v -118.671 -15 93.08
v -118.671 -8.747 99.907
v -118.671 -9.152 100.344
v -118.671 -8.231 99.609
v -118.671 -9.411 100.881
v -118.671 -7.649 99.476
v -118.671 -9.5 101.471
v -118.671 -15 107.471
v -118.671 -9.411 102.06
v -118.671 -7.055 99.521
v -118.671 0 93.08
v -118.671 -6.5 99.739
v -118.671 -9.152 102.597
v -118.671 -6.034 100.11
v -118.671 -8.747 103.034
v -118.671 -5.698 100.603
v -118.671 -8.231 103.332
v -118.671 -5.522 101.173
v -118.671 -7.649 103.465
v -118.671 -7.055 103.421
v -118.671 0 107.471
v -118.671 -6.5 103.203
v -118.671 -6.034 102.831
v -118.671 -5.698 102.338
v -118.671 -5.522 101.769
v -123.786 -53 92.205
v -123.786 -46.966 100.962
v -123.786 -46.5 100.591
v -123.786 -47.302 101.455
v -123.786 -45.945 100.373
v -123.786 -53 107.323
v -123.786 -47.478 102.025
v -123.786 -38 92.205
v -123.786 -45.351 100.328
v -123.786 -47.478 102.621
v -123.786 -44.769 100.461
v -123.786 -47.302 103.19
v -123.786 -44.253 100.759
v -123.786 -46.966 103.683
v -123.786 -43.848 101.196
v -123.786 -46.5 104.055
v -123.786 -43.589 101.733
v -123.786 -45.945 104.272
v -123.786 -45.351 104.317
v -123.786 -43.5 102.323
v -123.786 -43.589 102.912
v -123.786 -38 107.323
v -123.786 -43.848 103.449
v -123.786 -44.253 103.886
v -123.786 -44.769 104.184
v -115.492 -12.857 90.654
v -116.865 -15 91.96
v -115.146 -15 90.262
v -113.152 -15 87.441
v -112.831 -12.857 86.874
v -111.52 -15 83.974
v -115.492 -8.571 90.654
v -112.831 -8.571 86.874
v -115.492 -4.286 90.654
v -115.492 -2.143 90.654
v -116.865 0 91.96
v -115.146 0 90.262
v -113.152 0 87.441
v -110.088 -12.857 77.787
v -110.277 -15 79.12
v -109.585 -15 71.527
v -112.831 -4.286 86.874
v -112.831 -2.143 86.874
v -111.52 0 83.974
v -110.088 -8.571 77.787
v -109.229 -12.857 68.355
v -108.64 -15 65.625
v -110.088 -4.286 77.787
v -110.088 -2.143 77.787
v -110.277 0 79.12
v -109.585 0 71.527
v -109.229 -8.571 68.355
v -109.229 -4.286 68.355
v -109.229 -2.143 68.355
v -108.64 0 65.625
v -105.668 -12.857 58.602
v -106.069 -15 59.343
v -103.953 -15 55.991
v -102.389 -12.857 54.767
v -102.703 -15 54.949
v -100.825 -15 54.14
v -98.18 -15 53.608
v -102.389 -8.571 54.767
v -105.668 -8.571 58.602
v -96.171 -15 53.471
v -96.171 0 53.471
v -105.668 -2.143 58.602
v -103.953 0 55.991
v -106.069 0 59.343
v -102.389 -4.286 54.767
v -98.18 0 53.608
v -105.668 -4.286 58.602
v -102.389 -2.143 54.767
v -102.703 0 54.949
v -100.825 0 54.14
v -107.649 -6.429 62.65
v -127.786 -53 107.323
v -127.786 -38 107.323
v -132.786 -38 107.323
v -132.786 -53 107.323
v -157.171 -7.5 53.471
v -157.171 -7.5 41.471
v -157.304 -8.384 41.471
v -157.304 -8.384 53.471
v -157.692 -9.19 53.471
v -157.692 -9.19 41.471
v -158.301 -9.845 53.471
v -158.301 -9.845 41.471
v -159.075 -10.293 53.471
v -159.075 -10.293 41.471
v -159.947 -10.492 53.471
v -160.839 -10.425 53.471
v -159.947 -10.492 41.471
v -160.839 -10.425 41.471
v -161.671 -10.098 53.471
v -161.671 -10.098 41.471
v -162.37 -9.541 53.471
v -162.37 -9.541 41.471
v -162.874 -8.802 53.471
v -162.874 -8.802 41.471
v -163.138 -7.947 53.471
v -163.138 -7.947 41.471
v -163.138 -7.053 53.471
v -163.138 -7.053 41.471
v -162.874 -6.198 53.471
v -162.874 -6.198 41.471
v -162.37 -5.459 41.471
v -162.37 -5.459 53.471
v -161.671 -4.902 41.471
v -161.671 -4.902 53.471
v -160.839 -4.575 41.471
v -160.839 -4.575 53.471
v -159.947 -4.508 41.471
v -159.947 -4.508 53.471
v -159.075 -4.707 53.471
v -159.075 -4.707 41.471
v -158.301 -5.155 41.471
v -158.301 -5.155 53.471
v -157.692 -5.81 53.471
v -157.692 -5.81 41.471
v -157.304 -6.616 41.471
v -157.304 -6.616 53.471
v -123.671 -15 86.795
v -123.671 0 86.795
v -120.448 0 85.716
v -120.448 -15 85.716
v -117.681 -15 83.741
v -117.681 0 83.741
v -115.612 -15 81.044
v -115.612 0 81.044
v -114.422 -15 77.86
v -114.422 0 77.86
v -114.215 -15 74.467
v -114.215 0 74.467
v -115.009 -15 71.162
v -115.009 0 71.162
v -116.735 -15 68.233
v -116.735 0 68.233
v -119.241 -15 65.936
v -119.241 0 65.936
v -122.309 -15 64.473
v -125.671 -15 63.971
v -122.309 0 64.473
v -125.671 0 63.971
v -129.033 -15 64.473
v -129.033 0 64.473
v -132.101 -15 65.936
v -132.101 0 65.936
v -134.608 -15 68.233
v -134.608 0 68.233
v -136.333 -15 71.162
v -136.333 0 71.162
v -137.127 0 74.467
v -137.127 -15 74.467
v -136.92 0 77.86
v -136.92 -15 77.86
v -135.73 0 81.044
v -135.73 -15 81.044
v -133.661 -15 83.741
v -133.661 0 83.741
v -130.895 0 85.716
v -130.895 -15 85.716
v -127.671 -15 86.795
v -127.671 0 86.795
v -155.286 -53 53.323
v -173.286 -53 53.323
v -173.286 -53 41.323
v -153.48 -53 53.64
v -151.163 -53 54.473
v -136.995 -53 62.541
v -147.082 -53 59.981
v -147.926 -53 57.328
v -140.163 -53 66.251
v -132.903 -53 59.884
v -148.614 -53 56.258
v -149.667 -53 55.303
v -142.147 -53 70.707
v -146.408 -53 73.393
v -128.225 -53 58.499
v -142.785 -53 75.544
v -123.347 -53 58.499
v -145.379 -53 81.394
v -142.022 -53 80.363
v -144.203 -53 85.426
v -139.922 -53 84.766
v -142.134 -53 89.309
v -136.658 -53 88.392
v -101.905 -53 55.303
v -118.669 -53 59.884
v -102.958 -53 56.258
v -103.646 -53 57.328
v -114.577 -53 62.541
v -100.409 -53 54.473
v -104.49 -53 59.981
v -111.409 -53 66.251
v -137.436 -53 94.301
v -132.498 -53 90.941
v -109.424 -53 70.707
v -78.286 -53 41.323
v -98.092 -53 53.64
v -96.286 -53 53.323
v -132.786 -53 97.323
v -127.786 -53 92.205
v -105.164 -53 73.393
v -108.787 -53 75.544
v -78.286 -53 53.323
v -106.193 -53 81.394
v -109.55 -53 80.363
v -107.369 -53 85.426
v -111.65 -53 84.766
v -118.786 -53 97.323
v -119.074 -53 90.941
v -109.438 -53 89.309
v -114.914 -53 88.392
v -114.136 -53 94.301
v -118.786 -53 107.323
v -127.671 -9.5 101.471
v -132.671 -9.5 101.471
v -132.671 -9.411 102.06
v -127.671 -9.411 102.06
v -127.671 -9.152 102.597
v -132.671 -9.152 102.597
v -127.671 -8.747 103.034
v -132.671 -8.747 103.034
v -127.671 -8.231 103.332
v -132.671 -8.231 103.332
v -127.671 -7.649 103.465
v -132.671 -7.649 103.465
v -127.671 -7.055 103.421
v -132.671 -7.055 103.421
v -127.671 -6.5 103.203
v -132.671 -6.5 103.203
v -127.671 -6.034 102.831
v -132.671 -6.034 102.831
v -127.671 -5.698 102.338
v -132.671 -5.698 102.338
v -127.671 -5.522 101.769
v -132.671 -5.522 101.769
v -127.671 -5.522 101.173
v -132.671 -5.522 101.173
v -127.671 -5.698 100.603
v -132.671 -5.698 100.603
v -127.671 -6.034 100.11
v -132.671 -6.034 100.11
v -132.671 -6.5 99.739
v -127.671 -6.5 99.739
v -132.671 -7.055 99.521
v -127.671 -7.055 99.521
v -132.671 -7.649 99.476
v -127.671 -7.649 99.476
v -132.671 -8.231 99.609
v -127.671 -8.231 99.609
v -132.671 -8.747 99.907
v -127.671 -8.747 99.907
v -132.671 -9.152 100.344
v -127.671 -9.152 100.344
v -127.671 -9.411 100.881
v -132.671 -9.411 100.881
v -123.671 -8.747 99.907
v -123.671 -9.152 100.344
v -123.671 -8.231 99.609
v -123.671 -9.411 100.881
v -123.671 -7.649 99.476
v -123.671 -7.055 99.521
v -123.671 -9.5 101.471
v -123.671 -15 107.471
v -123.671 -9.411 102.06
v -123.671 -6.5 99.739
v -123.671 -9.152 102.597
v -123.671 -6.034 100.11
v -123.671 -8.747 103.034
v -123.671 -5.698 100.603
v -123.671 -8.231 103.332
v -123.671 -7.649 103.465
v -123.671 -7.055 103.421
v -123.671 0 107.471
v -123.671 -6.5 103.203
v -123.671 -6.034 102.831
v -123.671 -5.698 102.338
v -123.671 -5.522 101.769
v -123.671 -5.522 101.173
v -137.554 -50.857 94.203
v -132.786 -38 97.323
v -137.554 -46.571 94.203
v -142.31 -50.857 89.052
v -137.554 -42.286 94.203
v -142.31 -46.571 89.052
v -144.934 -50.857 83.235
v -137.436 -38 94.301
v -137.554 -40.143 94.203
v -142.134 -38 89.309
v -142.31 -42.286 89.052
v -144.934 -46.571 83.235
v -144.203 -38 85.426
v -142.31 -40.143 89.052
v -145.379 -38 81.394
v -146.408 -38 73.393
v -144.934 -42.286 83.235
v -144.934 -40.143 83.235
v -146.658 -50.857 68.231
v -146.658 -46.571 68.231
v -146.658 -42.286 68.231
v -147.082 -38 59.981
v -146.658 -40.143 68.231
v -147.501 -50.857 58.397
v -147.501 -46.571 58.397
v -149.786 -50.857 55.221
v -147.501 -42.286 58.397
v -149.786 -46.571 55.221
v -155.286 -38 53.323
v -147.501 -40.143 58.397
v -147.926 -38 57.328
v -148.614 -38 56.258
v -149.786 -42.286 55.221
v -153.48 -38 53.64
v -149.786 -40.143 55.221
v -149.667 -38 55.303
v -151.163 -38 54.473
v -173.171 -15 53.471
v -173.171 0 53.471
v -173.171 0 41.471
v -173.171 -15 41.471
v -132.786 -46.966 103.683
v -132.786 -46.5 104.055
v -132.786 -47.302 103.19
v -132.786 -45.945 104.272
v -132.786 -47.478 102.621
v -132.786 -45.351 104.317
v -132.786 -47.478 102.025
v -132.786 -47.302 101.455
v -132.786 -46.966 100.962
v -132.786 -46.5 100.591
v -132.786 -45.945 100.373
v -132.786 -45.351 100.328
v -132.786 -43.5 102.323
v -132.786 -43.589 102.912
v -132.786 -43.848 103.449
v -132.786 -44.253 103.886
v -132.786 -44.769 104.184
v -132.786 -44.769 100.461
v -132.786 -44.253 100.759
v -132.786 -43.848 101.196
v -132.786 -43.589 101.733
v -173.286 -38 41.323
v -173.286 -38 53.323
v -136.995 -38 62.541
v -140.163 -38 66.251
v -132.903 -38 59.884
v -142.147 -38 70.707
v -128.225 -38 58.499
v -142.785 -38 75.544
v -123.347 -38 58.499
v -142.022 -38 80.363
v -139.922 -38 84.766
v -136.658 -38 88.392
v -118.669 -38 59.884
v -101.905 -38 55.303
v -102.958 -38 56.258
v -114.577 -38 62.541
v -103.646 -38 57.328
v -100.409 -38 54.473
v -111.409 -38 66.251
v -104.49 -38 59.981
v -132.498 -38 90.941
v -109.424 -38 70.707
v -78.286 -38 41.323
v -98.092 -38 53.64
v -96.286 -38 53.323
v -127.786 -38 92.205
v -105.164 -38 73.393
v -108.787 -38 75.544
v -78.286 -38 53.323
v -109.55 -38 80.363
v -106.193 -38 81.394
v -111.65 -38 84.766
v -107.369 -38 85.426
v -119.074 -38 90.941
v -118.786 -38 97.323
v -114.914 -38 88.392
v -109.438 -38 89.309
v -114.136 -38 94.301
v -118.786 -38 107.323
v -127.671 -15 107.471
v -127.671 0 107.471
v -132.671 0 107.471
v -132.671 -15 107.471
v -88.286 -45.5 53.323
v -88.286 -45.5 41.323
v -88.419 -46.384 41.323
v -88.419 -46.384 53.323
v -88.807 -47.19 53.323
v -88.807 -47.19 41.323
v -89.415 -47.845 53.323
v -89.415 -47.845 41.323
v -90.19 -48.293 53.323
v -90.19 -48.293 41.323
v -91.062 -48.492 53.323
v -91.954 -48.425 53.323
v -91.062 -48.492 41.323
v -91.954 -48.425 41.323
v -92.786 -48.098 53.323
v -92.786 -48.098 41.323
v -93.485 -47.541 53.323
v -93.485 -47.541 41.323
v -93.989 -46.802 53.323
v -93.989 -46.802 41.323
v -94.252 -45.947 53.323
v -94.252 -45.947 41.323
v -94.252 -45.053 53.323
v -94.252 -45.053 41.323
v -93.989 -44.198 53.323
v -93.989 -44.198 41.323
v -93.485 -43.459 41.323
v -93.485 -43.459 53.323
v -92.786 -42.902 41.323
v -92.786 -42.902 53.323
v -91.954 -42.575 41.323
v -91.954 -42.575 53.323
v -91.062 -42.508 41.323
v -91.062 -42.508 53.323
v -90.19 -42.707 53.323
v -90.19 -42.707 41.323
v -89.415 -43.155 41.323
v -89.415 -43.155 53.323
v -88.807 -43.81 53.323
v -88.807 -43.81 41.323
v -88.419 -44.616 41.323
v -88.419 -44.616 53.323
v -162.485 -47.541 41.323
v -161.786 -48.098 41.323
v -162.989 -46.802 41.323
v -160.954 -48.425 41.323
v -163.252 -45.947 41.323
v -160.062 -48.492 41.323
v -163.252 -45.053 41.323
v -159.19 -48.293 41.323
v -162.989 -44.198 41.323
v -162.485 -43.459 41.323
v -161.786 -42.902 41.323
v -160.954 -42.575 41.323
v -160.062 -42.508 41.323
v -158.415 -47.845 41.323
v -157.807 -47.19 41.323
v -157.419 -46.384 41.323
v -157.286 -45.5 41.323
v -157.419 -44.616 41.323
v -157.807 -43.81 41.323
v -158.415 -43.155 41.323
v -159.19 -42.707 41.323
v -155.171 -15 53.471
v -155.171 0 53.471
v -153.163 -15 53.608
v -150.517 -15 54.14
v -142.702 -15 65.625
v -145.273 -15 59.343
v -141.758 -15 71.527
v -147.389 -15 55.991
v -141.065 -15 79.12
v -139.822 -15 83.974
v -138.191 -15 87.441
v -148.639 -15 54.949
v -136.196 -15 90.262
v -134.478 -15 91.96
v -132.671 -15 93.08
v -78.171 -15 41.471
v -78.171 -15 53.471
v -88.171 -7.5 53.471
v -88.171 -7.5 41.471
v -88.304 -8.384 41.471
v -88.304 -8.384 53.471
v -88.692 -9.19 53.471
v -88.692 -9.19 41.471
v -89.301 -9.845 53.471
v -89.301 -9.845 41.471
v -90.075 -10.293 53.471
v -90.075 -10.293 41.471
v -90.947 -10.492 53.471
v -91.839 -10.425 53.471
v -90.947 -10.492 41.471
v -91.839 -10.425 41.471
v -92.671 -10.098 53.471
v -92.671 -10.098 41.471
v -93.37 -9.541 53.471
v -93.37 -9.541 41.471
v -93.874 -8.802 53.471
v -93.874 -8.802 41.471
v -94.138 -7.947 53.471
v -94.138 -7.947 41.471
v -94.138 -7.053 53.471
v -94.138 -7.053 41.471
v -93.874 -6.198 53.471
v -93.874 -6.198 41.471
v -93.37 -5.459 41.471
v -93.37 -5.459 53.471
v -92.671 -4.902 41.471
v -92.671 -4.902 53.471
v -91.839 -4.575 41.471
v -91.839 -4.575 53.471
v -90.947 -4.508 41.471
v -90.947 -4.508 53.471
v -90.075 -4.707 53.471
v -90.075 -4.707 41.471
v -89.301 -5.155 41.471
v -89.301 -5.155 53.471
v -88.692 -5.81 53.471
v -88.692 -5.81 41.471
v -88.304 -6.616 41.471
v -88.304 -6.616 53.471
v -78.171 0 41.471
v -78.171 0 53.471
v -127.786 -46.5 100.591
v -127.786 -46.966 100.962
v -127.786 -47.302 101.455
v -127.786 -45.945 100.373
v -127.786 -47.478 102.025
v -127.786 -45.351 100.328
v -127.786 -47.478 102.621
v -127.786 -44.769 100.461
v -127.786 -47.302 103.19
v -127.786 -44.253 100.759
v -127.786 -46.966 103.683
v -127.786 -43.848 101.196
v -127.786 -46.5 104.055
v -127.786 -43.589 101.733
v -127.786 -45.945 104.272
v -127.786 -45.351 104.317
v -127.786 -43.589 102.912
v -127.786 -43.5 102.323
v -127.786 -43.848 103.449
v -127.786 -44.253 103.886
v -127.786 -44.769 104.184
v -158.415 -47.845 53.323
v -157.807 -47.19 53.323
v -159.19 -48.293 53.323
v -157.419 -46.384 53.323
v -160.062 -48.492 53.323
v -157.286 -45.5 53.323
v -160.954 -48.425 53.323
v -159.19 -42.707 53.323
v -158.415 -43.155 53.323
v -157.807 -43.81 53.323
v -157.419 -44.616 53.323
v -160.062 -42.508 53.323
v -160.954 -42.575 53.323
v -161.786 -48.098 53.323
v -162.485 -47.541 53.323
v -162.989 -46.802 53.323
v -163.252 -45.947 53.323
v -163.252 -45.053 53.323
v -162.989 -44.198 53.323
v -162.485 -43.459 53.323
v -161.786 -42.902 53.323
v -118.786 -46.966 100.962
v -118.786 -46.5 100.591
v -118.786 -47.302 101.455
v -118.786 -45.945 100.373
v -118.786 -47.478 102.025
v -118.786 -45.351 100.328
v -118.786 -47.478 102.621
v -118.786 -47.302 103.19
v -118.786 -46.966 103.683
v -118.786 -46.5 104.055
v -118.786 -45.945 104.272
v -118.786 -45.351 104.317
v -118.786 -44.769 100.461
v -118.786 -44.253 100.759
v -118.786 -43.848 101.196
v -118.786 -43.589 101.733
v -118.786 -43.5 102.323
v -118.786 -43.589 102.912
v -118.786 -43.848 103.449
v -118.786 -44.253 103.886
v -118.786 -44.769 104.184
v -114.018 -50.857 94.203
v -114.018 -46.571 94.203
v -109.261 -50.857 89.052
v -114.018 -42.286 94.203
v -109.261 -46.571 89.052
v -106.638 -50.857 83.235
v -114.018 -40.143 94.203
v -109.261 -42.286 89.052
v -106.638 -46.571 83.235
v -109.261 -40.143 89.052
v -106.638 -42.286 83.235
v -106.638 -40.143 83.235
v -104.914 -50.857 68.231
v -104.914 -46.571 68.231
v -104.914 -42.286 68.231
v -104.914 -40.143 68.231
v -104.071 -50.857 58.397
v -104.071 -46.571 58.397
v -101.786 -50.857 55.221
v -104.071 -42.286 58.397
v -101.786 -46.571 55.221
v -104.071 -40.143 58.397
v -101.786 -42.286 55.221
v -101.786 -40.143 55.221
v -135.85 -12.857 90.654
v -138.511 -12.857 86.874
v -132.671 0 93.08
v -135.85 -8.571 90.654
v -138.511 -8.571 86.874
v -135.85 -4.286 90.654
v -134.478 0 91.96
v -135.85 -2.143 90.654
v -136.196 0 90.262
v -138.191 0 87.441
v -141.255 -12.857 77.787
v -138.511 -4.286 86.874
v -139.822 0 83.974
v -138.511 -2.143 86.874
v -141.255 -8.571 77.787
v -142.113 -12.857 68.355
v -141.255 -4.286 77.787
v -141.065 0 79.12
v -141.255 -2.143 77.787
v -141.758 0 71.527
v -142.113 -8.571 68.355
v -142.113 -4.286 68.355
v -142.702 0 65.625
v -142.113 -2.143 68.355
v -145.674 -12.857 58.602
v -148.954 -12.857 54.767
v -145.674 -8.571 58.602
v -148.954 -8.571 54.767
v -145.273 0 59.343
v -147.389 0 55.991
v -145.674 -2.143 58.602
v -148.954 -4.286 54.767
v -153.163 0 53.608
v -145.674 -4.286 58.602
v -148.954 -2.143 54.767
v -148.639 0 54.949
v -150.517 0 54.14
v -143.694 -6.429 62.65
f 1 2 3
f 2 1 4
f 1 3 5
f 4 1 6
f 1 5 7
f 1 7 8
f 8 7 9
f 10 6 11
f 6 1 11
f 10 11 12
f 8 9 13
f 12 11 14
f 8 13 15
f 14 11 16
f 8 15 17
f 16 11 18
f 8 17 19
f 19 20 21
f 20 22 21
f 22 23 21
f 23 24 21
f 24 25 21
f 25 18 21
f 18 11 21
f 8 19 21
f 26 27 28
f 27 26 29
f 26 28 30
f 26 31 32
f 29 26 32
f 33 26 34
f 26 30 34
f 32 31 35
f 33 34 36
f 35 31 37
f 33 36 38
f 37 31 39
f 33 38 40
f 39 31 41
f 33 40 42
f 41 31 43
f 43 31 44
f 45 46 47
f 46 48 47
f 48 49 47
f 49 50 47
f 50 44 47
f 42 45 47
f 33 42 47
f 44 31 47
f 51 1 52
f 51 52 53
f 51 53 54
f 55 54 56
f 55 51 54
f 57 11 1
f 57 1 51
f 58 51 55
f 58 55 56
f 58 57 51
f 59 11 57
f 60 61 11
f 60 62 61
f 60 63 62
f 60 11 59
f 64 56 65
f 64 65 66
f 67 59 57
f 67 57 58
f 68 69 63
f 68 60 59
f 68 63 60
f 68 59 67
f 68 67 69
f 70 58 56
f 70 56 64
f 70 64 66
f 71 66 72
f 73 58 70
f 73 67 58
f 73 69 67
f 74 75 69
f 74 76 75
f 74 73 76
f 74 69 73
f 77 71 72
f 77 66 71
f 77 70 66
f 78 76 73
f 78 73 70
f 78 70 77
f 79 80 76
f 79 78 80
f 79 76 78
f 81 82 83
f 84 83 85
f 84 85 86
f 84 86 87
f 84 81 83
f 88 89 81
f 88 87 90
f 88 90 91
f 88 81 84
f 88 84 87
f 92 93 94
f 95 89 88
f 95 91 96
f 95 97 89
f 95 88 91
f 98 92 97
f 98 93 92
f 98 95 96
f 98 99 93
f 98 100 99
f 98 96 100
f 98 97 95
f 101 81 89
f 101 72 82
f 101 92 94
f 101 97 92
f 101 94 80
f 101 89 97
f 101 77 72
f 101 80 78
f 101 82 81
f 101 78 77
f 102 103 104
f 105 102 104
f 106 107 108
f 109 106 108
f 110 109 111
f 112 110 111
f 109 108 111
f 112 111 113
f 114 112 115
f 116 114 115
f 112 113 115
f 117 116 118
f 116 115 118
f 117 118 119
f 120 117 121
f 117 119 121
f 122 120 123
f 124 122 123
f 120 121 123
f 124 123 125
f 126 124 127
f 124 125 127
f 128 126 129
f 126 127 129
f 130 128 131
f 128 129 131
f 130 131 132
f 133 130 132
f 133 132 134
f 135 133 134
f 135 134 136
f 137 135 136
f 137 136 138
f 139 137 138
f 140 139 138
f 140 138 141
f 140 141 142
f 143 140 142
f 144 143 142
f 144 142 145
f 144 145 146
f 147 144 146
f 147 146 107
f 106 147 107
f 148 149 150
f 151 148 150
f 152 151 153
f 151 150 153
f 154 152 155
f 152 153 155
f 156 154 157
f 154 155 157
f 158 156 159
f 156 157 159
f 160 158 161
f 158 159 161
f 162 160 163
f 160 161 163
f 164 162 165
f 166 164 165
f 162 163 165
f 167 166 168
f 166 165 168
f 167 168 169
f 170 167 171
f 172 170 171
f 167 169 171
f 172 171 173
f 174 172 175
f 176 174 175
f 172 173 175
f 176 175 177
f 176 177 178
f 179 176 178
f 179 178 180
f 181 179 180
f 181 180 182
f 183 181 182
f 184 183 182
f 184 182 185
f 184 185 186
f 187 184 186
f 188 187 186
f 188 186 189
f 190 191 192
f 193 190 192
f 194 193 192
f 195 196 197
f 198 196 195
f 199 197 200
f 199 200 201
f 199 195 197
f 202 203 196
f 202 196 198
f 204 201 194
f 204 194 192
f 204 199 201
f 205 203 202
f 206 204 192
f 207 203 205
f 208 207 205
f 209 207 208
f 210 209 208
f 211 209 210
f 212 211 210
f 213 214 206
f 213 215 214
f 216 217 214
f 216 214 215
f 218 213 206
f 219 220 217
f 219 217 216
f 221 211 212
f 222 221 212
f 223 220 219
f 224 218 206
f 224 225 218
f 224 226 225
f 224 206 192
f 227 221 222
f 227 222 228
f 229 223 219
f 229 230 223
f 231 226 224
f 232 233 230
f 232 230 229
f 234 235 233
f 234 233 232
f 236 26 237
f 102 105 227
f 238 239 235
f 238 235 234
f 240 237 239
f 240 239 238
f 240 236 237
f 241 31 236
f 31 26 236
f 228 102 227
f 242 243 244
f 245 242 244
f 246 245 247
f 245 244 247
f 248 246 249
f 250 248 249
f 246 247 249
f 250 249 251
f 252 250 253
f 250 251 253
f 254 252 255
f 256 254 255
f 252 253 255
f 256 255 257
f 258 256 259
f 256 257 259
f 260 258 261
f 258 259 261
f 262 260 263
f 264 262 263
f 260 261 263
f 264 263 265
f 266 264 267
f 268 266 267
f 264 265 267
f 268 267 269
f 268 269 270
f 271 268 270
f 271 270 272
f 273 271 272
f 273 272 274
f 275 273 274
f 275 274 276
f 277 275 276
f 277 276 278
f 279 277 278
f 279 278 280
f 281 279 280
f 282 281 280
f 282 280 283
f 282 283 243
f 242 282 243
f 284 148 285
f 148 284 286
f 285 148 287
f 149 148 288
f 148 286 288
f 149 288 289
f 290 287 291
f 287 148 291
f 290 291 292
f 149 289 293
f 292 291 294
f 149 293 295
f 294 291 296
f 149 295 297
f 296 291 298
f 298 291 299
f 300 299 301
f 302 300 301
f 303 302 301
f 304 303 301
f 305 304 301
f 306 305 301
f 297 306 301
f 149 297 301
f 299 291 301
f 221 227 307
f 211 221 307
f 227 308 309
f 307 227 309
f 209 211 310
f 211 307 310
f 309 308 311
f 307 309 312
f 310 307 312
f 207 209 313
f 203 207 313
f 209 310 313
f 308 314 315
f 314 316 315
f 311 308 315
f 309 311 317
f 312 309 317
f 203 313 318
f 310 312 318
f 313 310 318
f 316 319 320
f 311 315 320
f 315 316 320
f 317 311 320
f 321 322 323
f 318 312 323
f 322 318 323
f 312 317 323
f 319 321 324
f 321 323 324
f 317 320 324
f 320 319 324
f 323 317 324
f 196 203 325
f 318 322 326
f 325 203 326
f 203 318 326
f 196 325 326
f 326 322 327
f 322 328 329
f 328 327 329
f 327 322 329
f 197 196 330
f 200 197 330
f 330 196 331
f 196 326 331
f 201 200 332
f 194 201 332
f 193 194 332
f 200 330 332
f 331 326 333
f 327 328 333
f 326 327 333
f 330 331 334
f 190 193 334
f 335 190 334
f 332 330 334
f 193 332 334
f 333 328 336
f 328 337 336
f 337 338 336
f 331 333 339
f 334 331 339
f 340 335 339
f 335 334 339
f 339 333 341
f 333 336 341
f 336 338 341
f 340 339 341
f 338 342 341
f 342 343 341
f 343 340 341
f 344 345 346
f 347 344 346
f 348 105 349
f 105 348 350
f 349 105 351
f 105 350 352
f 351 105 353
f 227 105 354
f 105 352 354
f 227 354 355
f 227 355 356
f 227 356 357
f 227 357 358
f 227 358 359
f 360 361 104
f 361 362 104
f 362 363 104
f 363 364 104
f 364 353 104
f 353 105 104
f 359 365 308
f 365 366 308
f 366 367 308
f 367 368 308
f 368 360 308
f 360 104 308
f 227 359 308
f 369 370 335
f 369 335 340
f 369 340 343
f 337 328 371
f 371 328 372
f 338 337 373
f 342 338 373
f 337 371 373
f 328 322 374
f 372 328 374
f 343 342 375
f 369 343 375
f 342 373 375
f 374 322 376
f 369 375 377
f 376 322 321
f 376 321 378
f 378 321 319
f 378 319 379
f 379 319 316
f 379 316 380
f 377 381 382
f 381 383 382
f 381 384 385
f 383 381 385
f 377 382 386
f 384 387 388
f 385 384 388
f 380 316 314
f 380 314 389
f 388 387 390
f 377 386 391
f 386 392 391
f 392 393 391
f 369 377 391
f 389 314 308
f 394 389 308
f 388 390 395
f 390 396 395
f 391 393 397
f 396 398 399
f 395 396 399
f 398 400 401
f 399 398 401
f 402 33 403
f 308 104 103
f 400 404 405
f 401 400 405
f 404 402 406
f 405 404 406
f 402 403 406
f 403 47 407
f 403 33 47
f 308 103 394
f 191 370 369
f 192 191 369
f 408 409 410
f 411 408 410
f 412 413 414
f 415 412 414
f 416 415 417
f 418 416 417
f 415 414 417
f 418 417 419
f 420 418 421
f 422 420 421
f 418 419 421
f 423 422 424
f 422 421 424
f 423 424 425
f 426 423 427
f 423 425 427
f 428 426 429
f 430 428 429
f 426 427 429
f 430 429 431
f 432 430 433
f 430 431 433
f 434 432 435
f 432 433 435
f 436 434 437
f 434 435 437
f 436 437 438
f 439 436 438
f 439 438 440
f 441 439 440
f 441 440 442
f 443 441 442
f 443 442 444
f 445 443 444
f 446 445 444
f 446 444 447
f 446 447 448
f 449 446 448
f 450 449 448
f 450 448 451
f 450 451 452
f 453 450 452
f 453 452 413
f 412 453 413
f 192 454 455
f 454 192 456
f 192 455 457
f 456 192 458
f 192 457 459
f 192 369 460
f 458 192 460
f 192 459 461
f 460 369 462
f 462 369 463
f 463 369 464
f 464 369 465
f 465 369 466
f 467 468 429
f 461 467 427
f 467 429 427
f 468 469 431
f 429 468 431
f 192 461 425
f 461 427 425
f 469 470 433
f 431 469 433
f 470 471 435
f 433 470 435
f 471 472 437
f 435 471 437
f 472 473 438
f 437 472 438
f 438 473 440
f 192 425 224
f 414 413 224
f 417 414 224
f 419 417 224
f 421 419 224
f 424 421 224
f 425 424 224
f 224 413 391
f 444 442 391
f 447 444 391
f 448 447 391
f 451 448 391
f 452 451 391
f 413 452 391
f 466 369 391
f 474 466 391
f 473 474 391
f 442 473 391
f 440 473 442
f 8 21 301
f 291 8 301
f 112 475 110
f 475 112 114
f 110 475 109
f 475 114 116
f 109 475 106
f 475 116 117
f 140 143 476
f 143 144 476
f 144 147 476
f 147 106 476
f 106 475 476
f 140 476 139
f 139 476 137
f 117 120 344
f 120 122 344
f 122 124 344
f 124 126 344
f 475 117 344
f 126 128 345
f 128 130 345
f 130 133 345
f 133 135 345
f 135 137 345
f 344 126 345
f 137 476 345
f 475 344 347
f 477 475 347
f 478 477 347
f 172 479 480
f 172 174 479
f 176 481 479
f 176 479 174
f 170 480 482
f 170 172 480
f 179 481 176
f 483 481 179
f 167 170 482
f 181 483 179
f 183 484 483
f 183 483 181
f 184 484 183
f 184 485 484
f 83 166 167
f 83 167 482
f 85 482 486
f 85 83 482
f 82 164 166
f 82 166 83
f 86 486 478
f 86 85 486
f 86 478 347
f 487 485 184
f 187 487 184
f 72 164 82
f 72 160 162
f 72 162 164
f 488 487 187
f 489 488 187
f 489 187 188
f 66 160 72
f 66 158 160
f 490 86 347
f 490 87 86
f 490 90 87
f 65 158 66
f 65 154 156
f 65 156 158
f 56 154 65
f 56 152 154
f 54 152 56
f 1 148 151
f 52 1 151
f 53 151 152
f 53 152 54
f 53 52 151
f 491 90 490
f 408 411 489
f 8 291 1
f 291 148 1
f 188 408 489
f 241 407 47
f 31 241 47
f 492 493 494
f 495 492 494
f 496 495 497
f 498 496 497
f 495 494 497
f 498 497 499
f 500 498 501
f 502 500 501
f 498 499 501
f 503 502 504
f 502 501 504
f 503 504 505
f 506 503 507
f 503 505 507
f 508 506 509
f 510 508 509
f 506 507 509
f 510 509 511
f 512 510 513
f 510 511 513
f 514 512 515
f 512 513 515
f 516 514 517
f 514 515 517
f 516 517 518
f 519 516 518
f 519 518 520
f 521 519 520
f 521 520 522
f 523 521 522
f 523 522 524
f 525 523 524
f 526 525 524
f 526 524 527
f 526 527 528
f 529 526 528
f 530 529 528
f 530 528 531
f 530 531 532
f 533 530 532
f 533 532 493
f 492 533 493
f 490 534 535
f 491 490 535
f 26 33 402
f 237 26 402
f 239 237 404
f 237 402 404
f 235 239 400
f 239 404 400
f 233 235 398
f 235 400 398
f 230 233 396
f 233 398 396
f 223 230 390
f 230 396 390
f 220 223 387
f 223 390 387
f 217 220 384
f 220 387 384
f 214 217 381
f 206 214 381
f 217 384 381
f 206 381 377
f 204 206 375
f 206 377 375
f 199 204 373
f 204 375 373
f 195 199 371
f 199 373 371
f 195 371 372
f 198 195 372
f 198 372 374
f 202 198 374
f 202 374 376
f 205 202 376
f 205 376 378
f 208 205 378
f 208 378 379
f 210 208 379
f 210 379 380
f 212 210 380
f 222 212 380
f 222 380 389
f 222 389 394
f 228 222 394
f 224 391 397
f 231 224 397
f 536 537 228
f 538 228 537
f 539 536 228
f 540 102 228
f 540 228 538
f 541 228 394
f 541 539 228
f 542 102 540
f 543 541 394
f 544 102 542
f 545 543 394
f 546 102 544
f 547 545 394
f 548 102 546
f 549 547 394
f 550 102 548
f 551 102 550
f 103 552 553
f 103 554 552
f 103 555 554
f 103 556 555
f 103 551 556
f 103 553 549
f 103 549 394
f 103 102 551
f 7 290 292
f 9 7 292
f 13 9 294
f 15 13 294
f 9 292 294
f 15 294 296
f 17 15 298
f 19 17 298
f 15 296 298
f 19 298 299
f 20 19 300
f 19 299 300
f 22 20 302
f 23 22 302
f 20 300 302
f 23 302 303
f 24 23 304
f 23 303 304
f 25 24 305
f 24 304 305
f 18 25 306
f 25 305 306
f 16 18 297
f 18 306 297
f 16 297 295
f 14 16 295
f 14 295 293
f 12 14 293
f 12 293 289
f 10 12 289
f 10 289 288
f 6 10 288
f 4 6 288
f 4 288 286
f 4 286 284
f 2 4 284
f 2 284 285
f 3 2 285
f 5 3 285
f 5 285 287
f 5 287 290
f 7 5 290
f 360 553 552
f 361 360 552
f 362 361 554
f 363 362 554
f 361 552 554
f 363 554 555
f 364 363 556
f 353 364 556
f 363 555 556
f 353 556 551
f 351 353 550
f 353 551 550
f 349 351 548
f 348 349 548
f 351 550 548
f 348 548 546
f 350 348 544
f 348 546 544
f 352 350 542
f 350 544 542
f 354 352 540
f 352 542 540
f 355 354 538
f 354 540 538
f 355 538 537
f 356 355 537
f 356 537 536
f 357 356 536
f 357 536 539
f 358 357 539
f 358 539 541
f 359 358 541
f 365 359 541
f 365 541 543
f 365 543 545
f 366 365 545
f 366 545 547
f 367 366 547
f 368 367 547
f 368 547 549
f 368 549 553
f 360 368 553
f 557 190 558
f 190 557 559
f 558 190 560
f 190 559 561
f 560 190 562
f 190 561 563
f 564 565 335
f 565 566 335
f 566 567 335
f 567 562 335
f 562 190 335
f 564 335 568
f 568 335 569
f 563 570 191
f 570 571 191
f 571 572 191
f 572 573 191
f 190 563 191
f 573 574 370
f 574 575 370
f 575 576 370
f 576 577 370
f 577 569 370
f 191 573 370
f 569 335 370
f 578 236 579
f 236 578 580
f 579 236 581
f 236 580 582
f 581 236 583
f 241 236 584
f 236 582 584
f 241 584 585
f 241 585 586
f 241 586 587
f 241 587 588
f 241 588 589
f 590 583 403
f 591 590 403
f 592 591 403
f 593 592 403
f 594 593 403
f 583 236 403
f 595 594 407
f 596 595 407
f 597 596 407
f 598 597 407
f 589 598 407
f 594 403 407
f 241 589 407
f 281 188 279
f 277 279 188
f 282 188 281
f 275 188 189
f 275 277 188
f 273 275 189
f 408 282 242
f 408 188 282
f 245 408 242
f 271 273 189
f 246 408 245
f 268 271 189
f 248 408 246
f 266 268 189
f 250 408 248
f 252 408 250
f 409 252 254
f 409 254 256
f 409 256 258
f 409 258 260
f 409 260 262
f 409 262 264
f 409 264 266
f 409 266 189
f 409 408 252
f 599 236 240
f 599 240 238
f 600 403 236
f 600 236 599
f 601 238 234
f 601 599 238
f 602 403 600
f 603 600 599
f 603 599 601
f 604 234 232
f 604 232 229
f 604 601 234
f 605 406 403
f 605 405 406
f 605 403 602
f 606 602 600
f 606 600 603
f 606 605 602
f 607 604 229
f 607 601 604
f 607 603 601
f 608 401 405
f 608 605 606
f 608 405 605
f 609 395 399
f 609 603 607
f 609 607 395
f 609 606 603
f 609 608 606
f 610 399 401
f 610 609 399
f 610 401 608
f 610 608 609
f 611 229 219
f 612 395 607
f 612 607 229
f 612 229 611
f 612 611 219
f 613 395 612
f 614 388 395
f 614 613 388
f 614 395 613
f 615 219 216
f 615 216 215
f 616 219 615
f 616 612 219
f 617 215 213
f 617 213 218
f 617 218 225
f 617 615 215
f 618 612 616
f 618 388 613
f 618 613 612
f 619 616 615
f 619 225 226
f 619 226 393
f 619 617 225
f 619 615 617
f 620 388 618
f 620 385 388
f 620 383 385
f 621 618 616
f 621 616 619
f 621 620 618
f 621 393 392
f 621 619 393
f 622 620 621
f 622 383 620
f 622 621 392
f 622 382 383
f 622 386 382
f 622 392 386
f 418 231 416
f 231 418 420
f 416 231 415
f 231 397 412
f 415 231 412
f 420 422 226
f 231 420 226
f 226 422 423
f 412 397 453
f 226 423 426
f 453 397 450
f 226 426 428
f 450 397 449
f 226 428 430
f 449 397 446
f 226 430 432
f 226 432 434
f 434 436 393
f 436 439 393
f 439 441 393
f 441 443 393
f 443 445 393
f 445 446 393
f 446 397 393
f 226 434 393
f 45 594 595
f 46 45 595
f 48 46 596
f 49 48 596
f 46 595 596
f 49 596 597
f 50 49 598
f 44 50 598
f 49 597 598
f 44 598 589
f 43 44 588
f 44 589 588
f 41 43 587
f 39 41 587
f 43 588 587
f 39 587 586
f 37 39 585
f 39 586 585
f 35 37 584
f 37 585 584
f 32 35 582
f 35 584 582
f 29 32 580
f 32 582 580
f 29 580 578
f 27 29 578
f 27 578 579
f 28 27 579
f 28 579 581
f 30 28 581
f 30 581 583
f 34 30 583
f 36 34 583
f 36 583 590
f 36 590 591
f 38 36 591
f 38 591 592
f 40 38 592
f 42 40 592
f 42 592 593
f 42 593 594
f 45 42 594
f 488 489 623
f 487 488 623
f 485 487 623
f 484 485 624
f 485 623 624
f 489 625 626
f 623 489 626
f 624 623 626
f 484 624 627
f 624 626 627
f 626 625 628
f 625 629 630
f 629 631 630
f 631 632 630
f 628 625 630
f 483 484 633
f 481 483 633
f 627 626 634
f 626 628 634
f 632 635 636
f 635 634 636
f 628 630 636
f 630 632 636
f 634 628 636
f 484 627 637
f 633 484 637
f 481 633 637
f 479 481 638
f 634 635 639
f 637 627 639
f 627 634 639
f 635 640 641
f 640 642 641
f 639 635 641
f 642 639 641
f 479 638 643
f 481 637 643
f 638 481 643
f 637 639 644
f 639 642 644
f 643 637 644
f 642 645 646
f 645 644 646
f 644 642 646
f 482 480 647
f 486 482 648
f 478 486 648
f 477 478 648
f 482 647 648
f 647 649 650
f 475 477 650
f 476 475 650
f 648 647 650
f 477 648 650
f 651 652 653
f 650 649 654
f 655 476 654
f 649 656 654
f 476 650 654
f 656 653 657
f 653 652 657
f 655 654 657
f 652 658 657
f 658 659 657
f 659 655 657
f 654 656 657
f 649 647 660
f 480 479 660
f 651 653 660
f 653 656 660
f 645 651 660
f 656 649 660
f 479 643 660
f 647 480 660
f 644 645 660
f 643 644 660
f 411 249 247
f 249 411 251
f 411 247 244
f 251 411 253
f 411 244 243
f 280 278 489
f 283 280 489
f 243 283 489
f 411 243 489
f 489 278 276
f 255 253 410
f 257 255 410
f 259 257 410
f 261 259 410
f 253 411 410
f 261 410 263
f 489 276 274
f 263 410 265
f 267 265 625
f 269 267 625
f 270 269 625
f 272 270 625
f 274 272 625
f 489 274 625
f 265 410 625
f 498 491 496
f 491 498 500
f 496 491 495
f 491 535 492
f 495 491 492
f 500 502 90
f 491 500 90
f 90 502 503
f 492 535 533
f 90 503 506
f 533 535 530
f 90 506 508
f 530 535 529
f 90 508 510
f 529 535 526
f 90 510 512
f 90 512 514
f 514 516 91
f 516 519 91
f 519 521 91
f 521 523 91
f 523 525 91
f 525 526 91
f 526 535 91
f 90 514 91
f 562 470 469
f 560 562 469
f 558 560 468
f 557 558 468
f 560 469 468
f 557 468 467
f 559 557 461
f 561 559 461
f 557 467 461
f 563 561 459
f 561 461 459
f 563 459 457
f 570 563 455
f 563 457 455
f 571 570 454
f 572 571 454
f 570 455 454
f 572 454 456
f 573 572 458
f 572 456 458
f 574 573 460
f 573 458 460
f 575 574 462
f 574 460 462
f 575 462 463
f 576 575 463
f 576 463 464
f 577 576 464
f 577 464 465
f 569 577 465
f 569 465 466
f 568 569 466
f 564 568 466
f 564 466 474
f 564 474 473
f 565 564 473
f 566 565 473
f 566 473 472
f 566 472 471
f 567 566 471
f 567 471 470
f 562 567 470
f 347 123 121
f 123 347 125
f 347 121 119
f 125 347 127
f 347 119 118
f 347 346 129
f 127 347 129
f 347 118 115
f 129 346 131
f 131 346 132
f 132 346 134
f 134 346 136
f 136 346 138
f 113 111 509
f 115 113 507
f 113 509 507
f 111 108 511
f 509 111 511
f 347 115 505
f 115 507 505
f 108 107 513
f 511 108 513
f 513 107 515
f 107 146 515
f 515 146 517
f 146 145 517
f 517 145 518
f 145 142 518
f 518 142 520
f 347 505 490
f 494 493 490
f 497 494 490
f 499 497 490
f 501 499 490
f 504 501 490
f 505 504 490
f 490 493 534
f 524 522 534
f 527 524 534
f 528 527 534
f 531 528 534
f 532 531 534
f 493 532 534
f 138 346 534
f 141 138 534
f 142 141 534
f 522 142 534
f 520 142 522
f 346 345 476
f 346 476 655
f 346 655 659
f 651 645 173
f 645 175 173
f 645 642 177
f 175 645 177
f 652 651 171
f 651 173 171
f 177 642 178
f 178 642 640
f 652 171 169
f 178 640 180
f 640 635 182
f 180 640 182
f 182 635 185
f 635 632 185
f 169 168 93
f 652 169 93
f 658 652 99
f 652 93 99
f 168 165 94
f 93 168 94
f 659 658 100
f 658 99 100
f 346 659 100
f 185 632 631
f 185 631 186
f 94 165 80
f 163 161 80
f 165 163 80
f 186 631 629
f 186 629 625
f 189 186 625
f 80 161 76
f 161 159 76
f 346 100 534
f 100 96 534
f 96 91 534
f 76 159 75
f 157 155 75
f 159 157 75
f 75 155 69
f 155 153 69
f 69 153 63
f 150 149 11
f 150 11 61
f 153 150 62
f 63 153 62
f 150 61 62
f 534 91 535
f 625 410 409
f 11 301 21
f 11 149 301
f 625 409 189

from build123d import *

# Parameters (mm, degrees)
F1_DEPTH  = 15
F3_W      = 4
F3_H      = 15
F4_DEPTH  = 25
F5_R      = 3
F6_DEPTH  = 25
F7_R      = 2
F8_DEPTH  = 25
F10_DEPTH = 15
F11_R     = 3
F12_DEPTH = 25
F13_W     = 4
F13_H     = 15
F14_DEPTH = 25
F15_R     = 2
F16_DEPTH = 25


# Not quite as in the source:
# - a feature names something its author has since deleted; it is built from what else it names


with BuildPart() as f1:
    # F0 (on Front) → F1 (new body)
    with BuildSketch(Plane.XZ):
        with BuildLine():
            Line((-125.6711477041, 86.9706617594), (-125.6711477041, 107.4706617594))
            Line((-125.6711477041, 107.4706617594), (-132.6711477041, 107.4706617594))
            Line((-132.6711477041, 107.4706617594), (-132.6711477041, 93.0804520496))
            add(Edge.make_bspline(
                [(-132.6711477041, 93.0804520496), (-134.8444351683, 92.1647803788), (-139.3318293406, 86.8815258397), (-141.6489540104, 77.9315652386), (-141.6385080687, 68.53125191), (-143.7808164235, 62.0408932683), (-145.6725641316, 58.6368592184), (-148.1505873732, 53.9411069546), (-153.9757510035, 53.4706617594), (-155.1711477041, 53.4706617594)],
                knots=[0, 0, 0, 0, 0.1589153696, 0.3266349591, 0.4941602985, 0.6338202377, 0.7405177517, 0.8628095578, 1, 1, 1, 1], degree=3))
            Line((-155.1711477041, 53.4706617594), (-173.1711477041, 53.4706617594))
            Line((-173.1711477041, 53.4706617594), (-173.1711477041, 41.4706617594))
            Line((-173.1711477041, 41.4706617594), (-125.6711477041, 41.4706617594))
            Line((-125.6711477041, 41.4706617594), (-125.6711477041, 63.9706617594))
            ThreePointArc((-125.6711477041, 63.9706617594), (-137.1711477041, 75.4706617594), (-125.6711477041, 86.9706617594))
        make_face()
        with BuildLine():
            Line((-118.6711477041, 107.4706617594), (-125.6711477041, 107.4706617594))
            Line((-125.6711477041, 107.4706617594), (-125.6711477041, 86.9706617594))
            ThreePointArc((-125.6711477041, 86.9706617594), (-114.1711477041, 75.4706617594), (-125.6711477041, 63.9706617594))
            Line((-125.6711477041, 63.9706617594), (-125.6711477041, 41.4706617594))
            Line((-125.6711477041, 41.4706617594), (-78.1711477041, 41.4706617594))
            Line((-78.1711477041, 41.4706617594), (-78.1711477041, 53.4706617594))
            Line((-78.1711477041, 53.4706617594), (-96.1711477041, 53.4706617594))
            add(Edge.make_bspline(
                [(-118.6711477041, 93.0804520496), (-116.49786024, 92.1647803788), (-112.0104660676, 86.8815258397), (-109.6933413979, 77.9315652386), (-109.7037873395, 68.53125191), (-107.5614789847, 62.0408932683), (-105.6697312766, 58.6368592184), (-103.191708035, 53.9411069546), (-97.3665444048, 53.4706617594), (-96.1711477041, 53.4706617594)],
                knots=[0, 0, 0, 0, 0.1589153696, 0.3266349591, 0.4941602985, 0.6338202377, 0.7405177517, 0.8628095578, 1, 1, 1, 1], degree=3))
            Line((-118.6711477041, 93.0804520496), (-118.6711477041, 107.4706617594))
        make_face()
    extrude(amount=F1_DEPTH)

    # F3 (on face) → F4 (cut)
    with BuildSketch(Plane.XY.offset(107.4706617594)):
        with Locations((-125.6711477041, -7.5)):
            Rectangle(F3_W, F3_H)
    extrude(amount=-F4_DEPTH, mode=Mode.SUBTRACT)

    # F5 (on face) → F6 (cut)
    with BuildSketch(Plane(origin=(0, 0, 41.4706617594), x_dir=(1, 0, 0), z_dir=(0, 0, -1))):
        with Locations((-160.1711477041, 7.5)):
            Circle(F5_R)
        with Locations((-91.1711477041, 7.5)):
            Circle(F5_R)
    extrude(amount=-F6_DEPTH, mode=Mode.SUBTRACT)

    # F7 (on face) → F8 (cut)
    with BuildSketch(Plane(origin=(-132.6711477041, 0, 0), x_dir=(0, -1, 0), z_dir=(-1, 0, 0))):
        with Locations((7.5, 101.4706617594)):
            Circle(F7_R)
    extrude(amount=-F8_DEPTH, mode=Mode.SUBTRACT)


with BuildPart() as f10:
    # F9 (on offset) → F10 (new body)
    with BuildSketch(Plane.XZ.offset(38)):
        with BuildLine():
            Line((-125.7859611511, 92.3226373494), (-125.7859611511, 107.3226373494))
            Line((-125.7859611511, 107.3226373494), (-132.7859611511, 107.3226373494))
            Line((-132.7859611511, 107.3226373494), (-132.7859611511, 97.3226373494))
            add(Edge.make_bspline(
                [(-132.7859611511, 97.3226373494), (-135.3544034247, 96.2404750185), (-144.1033534904, 89.486584983), (-146.1690728794, 77.6369899314), (-146.7872760168, 68.4366512578), (-146.5336940779, 62.8295997289), (-147.3177284091, 58.2938754382), (-149.1347203045, 54.8107556411), (-154.1745465523, 53.3226373494), (-155.2859611511, 53.3226373494)],
                knots=[0, 0, 0, 0, 0.1878099238, 0.3732226175, 0.5329240866, 0.6574575834, 0.7678477858, 0.8724478156, 1, 1, 1, 1], degree=3))
            Line((-155.2859611511, 53.3226373494), (-173.2859611511, 53.3226373494))
            Line((-173.2859611511, 53.3226373494), (-173.2859611511, 41.3226373494))
            Line((-173.2859611511, 41.3226373494), (-125.7859611511, 41.3226373494))
            Line((-125.7859611511, 41.3226373494), (-125.7859611511, 58.3226373494))
            ThreePointArc((-125.7859611511, 58.3226373494), (-142.7859611511, 75.3226373494), (-125.7859611511, 92.3226373494))
        make_face()
        with BuildLine():
            Line((-118.7859611511, 107.3226373494), (-125.7859611511, 107.3226373494))
            Line((-125.7859611511, 107.3226373494), (-125.7859611511, 92.3226373494))
            ThreePointArc((-125.7859611511, 92.3226373494), (-108.7859611511, 75.3226373494), (-125.7859611511, 58.3226373494))
            Line((-125.7859611511, 58.3226373494), (-125.7859611511, 41.3226373494))
            Line((-125.7859611511, 41.3226373494), (-78.2859611511, 41.3226373494))
            Line((-78.2859611511, 41.3226373494), (-78.2859611511, 53.3226373494))
            Line((-78.2859611511, 53.3226373494), (-96.2859611511, 53.3226373494))
            add(Edge.make_bspline(
                [(-118.7859611511, 97.3226373494), (-116.2175188776, 96.2404750185), (-107.4685688118, 89.486584983), (-105.4028494228, 77.6369899314), (-104.7846462854, 68.4366512578), (-105.0382282244, 62.8295997289), (-104.2541938932, 58.2938754382), (-102.4372019978, 54.8107556411), (-97.39737575, 53.3226373494), (-96.2859611511, 53.3226373494)],
                knots=[0, 0, 0, 0, 0.1878099238, 0.3732226175, 0.5329240866, 0.6574575834, 0.7678477858, 0.8724478156, 1, 1, 1, 1], degree=3))
            Line((-118.7859611511, 97.3226373494), (-118.7859611511, 107.3226373494))
        make_face()
    extrude(amount=F10_DEPTH)

    # F11 (on face) → F12 (cut)
    with BuildSketch(Plane(origin=(0, 0, 41.3226373494), x_dir=(1, 0, 0), z_dir=(0, 0, -1))):
        with Locations((-160.2859611511, 45.5)):
            Circle(F11_R)
        with Locations((-91.2859611511, 45.5)):
            Circle(F11_R)
    extrude(amount=-F12_DEPTH, mode=Mode.SUBTRACT)

    # F13 (on face) → F14 (cut)
    with BuildSketch(Plane.XY.offset(107.3226373494)):
        with Locations((-125.7859611511, -45.5)):
            Rectangle(F13_W, F13_H)
    extrude(amount=-F14_DEPTH, mode=Mode.SUBTRACT)

    # F15 (on face) → F16 (cut)
    with BuildSketch(Plane.YZ.offset(-118.7859611511)):
        with Locations((-45.5, 102.3226373494)):
            Circle(F15_R)
    extrude(amount=-F16_DEPTH, mode=Mode.SUBTRACT)


solid = Compound([f1.part, f10.part])
